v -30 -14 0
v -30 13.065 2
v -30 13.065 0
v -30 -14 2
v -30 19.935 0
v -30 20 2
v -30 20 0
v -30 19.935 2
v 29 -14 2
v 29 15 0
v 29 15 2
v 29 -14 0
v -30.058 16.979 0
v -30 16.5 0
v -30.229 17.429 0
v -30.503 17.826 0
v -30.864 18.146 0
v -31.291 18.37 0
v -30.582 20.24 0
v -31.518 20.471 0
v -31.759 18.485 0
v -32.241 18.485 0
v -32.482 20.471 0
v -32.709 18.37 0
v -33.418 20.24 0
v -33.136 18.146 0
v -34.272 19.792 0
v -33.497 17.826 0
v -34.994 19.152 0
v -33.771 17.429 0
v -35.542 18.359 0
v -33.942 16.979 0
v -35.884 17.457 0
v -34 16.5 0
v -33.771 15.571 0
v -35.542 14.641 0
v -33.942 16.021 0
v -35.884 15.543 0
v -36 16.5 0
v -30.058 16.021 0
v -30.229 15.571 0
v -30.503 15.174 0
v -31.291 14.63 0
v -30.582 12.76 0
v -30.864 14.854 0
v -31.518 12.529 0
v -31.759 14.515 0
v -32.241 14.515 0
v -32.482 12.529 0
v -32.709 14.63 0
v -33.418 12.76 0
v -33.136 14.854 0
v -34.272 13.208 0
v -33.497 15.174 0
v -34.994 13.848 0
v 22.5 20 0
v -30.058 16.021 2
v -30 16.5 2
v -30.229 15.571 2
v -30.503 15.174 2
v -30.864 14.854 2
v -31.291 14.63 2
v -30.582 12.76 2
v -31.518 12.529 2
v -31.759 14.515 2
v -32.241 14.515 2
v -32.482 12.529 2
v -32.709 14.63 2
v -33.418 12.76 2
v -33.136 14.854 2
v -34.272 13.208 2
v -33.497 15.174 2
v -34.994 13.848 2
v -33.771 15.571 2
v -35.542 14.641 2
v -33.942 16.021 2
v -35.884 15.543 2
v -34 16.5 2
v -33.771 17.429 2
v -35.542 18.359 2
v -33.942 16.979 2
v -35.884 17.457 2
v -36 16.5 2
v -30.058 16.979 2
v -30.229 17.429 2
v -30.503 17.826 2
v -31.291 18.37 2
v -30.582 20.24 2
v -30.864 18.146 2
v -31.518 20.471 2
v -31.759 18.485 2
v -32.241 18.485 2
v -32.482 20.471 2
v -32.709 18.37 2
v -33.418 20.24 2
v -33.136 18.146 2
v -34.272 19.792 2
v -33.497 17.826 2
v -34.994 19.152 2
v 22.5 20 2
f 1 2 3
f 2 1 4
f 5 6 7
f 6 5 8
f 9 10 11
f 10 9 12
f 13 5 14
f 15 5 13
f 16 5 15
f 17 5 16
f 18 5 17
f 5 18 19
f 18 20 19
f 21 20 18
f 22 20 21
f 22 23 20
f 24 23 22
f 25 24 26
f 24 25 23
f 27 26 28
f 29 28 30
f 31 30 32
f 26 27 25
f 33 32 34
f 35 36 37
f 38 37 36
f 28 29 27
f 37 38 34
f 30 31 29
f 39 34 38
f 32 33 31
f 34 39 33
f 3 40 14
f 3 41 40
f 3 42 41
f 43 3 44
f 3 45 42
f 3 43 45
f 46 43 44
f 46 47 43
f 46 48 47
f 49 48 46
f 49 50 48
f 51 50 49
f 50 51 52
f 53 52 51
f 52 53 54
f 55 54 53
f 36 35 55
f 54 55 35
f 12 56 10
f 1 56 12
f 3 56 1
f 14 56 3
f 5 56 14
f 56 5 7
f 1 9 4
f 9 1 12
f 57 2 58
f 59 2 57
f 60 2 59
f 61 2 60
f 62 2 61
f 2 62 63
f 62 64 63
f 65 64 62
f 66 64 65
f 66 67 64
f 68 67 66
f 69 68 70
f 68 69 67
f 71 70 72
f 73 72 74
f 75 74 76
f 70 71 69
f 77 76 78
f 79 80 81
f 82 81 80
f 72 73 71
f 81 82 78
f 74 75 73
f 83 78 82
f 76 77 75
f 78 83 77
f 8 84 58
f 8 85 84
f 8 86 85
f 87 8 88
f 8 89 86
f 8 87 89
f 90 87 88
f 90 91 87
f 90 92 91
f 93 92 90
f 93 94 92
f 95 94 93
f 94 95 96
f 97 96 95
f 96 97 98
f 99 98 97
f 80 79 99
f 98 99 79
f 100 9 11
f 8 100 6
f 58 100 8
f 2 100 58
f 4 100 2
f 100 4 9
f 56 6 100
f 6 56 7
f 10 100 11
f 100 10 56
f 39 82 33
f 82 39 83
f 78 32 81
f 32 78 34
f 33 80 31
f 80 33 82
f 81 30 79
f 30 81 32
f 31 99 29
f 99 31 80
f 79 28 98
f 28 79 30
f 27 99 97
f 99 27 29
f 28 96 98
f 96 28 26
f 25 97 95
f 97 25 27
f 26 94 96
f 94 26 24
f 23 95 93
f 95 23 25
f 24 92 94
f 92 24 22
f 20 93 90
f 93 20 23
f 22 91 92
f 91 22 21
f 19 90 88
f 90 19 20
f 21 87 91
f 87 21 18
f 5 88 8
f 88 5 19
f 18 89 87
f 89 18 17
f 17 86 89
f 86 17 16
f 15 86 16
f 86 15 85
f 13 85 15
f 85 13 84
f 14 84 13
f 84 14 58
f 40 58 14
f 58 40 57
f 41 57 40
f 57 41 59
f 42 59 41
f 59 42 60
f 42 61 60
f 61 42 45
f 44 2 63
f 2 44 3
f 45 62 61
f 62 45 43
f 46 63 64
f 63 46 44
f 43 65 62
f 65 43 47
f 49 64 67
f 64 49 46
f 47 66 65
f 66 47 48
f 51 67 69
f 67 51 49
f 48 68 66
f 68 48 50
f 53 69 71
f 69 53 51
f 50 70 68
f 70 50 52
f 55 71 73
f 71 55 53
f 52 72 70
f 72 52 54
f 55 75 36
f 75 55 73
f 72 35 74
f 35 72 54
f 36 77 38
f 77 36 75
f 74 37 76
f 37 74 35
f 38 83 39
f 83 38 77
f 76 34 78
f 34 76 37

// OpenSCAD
color ("red")
  scale ([.5,.5,1])
  translate ([0,0,2])
  linear_extrude(height = 2.0, center = false) 
  import ("/Users/rstmini/Documents/HackBergen/HackBergenLogo-wo-back.dxf", origin=[195,10]);
  
ppoints=[[-60,-28],[-60,40],[45,40],[58,30],[58,-28]]; 
color ("blue")
  scale ([.5,.5,1])
  translate ([0,0,0])
  linear_extrude(height = 2.0, center = false)
  polygon(ppoints);

color ("blue")
  scale ([.5,.5,1]) 
  translate([-64, 33, 0]) 
  rotate_extrude(convexity = 10) 
  translate([4, 0, 0])
  square ([4,2],center =false);
